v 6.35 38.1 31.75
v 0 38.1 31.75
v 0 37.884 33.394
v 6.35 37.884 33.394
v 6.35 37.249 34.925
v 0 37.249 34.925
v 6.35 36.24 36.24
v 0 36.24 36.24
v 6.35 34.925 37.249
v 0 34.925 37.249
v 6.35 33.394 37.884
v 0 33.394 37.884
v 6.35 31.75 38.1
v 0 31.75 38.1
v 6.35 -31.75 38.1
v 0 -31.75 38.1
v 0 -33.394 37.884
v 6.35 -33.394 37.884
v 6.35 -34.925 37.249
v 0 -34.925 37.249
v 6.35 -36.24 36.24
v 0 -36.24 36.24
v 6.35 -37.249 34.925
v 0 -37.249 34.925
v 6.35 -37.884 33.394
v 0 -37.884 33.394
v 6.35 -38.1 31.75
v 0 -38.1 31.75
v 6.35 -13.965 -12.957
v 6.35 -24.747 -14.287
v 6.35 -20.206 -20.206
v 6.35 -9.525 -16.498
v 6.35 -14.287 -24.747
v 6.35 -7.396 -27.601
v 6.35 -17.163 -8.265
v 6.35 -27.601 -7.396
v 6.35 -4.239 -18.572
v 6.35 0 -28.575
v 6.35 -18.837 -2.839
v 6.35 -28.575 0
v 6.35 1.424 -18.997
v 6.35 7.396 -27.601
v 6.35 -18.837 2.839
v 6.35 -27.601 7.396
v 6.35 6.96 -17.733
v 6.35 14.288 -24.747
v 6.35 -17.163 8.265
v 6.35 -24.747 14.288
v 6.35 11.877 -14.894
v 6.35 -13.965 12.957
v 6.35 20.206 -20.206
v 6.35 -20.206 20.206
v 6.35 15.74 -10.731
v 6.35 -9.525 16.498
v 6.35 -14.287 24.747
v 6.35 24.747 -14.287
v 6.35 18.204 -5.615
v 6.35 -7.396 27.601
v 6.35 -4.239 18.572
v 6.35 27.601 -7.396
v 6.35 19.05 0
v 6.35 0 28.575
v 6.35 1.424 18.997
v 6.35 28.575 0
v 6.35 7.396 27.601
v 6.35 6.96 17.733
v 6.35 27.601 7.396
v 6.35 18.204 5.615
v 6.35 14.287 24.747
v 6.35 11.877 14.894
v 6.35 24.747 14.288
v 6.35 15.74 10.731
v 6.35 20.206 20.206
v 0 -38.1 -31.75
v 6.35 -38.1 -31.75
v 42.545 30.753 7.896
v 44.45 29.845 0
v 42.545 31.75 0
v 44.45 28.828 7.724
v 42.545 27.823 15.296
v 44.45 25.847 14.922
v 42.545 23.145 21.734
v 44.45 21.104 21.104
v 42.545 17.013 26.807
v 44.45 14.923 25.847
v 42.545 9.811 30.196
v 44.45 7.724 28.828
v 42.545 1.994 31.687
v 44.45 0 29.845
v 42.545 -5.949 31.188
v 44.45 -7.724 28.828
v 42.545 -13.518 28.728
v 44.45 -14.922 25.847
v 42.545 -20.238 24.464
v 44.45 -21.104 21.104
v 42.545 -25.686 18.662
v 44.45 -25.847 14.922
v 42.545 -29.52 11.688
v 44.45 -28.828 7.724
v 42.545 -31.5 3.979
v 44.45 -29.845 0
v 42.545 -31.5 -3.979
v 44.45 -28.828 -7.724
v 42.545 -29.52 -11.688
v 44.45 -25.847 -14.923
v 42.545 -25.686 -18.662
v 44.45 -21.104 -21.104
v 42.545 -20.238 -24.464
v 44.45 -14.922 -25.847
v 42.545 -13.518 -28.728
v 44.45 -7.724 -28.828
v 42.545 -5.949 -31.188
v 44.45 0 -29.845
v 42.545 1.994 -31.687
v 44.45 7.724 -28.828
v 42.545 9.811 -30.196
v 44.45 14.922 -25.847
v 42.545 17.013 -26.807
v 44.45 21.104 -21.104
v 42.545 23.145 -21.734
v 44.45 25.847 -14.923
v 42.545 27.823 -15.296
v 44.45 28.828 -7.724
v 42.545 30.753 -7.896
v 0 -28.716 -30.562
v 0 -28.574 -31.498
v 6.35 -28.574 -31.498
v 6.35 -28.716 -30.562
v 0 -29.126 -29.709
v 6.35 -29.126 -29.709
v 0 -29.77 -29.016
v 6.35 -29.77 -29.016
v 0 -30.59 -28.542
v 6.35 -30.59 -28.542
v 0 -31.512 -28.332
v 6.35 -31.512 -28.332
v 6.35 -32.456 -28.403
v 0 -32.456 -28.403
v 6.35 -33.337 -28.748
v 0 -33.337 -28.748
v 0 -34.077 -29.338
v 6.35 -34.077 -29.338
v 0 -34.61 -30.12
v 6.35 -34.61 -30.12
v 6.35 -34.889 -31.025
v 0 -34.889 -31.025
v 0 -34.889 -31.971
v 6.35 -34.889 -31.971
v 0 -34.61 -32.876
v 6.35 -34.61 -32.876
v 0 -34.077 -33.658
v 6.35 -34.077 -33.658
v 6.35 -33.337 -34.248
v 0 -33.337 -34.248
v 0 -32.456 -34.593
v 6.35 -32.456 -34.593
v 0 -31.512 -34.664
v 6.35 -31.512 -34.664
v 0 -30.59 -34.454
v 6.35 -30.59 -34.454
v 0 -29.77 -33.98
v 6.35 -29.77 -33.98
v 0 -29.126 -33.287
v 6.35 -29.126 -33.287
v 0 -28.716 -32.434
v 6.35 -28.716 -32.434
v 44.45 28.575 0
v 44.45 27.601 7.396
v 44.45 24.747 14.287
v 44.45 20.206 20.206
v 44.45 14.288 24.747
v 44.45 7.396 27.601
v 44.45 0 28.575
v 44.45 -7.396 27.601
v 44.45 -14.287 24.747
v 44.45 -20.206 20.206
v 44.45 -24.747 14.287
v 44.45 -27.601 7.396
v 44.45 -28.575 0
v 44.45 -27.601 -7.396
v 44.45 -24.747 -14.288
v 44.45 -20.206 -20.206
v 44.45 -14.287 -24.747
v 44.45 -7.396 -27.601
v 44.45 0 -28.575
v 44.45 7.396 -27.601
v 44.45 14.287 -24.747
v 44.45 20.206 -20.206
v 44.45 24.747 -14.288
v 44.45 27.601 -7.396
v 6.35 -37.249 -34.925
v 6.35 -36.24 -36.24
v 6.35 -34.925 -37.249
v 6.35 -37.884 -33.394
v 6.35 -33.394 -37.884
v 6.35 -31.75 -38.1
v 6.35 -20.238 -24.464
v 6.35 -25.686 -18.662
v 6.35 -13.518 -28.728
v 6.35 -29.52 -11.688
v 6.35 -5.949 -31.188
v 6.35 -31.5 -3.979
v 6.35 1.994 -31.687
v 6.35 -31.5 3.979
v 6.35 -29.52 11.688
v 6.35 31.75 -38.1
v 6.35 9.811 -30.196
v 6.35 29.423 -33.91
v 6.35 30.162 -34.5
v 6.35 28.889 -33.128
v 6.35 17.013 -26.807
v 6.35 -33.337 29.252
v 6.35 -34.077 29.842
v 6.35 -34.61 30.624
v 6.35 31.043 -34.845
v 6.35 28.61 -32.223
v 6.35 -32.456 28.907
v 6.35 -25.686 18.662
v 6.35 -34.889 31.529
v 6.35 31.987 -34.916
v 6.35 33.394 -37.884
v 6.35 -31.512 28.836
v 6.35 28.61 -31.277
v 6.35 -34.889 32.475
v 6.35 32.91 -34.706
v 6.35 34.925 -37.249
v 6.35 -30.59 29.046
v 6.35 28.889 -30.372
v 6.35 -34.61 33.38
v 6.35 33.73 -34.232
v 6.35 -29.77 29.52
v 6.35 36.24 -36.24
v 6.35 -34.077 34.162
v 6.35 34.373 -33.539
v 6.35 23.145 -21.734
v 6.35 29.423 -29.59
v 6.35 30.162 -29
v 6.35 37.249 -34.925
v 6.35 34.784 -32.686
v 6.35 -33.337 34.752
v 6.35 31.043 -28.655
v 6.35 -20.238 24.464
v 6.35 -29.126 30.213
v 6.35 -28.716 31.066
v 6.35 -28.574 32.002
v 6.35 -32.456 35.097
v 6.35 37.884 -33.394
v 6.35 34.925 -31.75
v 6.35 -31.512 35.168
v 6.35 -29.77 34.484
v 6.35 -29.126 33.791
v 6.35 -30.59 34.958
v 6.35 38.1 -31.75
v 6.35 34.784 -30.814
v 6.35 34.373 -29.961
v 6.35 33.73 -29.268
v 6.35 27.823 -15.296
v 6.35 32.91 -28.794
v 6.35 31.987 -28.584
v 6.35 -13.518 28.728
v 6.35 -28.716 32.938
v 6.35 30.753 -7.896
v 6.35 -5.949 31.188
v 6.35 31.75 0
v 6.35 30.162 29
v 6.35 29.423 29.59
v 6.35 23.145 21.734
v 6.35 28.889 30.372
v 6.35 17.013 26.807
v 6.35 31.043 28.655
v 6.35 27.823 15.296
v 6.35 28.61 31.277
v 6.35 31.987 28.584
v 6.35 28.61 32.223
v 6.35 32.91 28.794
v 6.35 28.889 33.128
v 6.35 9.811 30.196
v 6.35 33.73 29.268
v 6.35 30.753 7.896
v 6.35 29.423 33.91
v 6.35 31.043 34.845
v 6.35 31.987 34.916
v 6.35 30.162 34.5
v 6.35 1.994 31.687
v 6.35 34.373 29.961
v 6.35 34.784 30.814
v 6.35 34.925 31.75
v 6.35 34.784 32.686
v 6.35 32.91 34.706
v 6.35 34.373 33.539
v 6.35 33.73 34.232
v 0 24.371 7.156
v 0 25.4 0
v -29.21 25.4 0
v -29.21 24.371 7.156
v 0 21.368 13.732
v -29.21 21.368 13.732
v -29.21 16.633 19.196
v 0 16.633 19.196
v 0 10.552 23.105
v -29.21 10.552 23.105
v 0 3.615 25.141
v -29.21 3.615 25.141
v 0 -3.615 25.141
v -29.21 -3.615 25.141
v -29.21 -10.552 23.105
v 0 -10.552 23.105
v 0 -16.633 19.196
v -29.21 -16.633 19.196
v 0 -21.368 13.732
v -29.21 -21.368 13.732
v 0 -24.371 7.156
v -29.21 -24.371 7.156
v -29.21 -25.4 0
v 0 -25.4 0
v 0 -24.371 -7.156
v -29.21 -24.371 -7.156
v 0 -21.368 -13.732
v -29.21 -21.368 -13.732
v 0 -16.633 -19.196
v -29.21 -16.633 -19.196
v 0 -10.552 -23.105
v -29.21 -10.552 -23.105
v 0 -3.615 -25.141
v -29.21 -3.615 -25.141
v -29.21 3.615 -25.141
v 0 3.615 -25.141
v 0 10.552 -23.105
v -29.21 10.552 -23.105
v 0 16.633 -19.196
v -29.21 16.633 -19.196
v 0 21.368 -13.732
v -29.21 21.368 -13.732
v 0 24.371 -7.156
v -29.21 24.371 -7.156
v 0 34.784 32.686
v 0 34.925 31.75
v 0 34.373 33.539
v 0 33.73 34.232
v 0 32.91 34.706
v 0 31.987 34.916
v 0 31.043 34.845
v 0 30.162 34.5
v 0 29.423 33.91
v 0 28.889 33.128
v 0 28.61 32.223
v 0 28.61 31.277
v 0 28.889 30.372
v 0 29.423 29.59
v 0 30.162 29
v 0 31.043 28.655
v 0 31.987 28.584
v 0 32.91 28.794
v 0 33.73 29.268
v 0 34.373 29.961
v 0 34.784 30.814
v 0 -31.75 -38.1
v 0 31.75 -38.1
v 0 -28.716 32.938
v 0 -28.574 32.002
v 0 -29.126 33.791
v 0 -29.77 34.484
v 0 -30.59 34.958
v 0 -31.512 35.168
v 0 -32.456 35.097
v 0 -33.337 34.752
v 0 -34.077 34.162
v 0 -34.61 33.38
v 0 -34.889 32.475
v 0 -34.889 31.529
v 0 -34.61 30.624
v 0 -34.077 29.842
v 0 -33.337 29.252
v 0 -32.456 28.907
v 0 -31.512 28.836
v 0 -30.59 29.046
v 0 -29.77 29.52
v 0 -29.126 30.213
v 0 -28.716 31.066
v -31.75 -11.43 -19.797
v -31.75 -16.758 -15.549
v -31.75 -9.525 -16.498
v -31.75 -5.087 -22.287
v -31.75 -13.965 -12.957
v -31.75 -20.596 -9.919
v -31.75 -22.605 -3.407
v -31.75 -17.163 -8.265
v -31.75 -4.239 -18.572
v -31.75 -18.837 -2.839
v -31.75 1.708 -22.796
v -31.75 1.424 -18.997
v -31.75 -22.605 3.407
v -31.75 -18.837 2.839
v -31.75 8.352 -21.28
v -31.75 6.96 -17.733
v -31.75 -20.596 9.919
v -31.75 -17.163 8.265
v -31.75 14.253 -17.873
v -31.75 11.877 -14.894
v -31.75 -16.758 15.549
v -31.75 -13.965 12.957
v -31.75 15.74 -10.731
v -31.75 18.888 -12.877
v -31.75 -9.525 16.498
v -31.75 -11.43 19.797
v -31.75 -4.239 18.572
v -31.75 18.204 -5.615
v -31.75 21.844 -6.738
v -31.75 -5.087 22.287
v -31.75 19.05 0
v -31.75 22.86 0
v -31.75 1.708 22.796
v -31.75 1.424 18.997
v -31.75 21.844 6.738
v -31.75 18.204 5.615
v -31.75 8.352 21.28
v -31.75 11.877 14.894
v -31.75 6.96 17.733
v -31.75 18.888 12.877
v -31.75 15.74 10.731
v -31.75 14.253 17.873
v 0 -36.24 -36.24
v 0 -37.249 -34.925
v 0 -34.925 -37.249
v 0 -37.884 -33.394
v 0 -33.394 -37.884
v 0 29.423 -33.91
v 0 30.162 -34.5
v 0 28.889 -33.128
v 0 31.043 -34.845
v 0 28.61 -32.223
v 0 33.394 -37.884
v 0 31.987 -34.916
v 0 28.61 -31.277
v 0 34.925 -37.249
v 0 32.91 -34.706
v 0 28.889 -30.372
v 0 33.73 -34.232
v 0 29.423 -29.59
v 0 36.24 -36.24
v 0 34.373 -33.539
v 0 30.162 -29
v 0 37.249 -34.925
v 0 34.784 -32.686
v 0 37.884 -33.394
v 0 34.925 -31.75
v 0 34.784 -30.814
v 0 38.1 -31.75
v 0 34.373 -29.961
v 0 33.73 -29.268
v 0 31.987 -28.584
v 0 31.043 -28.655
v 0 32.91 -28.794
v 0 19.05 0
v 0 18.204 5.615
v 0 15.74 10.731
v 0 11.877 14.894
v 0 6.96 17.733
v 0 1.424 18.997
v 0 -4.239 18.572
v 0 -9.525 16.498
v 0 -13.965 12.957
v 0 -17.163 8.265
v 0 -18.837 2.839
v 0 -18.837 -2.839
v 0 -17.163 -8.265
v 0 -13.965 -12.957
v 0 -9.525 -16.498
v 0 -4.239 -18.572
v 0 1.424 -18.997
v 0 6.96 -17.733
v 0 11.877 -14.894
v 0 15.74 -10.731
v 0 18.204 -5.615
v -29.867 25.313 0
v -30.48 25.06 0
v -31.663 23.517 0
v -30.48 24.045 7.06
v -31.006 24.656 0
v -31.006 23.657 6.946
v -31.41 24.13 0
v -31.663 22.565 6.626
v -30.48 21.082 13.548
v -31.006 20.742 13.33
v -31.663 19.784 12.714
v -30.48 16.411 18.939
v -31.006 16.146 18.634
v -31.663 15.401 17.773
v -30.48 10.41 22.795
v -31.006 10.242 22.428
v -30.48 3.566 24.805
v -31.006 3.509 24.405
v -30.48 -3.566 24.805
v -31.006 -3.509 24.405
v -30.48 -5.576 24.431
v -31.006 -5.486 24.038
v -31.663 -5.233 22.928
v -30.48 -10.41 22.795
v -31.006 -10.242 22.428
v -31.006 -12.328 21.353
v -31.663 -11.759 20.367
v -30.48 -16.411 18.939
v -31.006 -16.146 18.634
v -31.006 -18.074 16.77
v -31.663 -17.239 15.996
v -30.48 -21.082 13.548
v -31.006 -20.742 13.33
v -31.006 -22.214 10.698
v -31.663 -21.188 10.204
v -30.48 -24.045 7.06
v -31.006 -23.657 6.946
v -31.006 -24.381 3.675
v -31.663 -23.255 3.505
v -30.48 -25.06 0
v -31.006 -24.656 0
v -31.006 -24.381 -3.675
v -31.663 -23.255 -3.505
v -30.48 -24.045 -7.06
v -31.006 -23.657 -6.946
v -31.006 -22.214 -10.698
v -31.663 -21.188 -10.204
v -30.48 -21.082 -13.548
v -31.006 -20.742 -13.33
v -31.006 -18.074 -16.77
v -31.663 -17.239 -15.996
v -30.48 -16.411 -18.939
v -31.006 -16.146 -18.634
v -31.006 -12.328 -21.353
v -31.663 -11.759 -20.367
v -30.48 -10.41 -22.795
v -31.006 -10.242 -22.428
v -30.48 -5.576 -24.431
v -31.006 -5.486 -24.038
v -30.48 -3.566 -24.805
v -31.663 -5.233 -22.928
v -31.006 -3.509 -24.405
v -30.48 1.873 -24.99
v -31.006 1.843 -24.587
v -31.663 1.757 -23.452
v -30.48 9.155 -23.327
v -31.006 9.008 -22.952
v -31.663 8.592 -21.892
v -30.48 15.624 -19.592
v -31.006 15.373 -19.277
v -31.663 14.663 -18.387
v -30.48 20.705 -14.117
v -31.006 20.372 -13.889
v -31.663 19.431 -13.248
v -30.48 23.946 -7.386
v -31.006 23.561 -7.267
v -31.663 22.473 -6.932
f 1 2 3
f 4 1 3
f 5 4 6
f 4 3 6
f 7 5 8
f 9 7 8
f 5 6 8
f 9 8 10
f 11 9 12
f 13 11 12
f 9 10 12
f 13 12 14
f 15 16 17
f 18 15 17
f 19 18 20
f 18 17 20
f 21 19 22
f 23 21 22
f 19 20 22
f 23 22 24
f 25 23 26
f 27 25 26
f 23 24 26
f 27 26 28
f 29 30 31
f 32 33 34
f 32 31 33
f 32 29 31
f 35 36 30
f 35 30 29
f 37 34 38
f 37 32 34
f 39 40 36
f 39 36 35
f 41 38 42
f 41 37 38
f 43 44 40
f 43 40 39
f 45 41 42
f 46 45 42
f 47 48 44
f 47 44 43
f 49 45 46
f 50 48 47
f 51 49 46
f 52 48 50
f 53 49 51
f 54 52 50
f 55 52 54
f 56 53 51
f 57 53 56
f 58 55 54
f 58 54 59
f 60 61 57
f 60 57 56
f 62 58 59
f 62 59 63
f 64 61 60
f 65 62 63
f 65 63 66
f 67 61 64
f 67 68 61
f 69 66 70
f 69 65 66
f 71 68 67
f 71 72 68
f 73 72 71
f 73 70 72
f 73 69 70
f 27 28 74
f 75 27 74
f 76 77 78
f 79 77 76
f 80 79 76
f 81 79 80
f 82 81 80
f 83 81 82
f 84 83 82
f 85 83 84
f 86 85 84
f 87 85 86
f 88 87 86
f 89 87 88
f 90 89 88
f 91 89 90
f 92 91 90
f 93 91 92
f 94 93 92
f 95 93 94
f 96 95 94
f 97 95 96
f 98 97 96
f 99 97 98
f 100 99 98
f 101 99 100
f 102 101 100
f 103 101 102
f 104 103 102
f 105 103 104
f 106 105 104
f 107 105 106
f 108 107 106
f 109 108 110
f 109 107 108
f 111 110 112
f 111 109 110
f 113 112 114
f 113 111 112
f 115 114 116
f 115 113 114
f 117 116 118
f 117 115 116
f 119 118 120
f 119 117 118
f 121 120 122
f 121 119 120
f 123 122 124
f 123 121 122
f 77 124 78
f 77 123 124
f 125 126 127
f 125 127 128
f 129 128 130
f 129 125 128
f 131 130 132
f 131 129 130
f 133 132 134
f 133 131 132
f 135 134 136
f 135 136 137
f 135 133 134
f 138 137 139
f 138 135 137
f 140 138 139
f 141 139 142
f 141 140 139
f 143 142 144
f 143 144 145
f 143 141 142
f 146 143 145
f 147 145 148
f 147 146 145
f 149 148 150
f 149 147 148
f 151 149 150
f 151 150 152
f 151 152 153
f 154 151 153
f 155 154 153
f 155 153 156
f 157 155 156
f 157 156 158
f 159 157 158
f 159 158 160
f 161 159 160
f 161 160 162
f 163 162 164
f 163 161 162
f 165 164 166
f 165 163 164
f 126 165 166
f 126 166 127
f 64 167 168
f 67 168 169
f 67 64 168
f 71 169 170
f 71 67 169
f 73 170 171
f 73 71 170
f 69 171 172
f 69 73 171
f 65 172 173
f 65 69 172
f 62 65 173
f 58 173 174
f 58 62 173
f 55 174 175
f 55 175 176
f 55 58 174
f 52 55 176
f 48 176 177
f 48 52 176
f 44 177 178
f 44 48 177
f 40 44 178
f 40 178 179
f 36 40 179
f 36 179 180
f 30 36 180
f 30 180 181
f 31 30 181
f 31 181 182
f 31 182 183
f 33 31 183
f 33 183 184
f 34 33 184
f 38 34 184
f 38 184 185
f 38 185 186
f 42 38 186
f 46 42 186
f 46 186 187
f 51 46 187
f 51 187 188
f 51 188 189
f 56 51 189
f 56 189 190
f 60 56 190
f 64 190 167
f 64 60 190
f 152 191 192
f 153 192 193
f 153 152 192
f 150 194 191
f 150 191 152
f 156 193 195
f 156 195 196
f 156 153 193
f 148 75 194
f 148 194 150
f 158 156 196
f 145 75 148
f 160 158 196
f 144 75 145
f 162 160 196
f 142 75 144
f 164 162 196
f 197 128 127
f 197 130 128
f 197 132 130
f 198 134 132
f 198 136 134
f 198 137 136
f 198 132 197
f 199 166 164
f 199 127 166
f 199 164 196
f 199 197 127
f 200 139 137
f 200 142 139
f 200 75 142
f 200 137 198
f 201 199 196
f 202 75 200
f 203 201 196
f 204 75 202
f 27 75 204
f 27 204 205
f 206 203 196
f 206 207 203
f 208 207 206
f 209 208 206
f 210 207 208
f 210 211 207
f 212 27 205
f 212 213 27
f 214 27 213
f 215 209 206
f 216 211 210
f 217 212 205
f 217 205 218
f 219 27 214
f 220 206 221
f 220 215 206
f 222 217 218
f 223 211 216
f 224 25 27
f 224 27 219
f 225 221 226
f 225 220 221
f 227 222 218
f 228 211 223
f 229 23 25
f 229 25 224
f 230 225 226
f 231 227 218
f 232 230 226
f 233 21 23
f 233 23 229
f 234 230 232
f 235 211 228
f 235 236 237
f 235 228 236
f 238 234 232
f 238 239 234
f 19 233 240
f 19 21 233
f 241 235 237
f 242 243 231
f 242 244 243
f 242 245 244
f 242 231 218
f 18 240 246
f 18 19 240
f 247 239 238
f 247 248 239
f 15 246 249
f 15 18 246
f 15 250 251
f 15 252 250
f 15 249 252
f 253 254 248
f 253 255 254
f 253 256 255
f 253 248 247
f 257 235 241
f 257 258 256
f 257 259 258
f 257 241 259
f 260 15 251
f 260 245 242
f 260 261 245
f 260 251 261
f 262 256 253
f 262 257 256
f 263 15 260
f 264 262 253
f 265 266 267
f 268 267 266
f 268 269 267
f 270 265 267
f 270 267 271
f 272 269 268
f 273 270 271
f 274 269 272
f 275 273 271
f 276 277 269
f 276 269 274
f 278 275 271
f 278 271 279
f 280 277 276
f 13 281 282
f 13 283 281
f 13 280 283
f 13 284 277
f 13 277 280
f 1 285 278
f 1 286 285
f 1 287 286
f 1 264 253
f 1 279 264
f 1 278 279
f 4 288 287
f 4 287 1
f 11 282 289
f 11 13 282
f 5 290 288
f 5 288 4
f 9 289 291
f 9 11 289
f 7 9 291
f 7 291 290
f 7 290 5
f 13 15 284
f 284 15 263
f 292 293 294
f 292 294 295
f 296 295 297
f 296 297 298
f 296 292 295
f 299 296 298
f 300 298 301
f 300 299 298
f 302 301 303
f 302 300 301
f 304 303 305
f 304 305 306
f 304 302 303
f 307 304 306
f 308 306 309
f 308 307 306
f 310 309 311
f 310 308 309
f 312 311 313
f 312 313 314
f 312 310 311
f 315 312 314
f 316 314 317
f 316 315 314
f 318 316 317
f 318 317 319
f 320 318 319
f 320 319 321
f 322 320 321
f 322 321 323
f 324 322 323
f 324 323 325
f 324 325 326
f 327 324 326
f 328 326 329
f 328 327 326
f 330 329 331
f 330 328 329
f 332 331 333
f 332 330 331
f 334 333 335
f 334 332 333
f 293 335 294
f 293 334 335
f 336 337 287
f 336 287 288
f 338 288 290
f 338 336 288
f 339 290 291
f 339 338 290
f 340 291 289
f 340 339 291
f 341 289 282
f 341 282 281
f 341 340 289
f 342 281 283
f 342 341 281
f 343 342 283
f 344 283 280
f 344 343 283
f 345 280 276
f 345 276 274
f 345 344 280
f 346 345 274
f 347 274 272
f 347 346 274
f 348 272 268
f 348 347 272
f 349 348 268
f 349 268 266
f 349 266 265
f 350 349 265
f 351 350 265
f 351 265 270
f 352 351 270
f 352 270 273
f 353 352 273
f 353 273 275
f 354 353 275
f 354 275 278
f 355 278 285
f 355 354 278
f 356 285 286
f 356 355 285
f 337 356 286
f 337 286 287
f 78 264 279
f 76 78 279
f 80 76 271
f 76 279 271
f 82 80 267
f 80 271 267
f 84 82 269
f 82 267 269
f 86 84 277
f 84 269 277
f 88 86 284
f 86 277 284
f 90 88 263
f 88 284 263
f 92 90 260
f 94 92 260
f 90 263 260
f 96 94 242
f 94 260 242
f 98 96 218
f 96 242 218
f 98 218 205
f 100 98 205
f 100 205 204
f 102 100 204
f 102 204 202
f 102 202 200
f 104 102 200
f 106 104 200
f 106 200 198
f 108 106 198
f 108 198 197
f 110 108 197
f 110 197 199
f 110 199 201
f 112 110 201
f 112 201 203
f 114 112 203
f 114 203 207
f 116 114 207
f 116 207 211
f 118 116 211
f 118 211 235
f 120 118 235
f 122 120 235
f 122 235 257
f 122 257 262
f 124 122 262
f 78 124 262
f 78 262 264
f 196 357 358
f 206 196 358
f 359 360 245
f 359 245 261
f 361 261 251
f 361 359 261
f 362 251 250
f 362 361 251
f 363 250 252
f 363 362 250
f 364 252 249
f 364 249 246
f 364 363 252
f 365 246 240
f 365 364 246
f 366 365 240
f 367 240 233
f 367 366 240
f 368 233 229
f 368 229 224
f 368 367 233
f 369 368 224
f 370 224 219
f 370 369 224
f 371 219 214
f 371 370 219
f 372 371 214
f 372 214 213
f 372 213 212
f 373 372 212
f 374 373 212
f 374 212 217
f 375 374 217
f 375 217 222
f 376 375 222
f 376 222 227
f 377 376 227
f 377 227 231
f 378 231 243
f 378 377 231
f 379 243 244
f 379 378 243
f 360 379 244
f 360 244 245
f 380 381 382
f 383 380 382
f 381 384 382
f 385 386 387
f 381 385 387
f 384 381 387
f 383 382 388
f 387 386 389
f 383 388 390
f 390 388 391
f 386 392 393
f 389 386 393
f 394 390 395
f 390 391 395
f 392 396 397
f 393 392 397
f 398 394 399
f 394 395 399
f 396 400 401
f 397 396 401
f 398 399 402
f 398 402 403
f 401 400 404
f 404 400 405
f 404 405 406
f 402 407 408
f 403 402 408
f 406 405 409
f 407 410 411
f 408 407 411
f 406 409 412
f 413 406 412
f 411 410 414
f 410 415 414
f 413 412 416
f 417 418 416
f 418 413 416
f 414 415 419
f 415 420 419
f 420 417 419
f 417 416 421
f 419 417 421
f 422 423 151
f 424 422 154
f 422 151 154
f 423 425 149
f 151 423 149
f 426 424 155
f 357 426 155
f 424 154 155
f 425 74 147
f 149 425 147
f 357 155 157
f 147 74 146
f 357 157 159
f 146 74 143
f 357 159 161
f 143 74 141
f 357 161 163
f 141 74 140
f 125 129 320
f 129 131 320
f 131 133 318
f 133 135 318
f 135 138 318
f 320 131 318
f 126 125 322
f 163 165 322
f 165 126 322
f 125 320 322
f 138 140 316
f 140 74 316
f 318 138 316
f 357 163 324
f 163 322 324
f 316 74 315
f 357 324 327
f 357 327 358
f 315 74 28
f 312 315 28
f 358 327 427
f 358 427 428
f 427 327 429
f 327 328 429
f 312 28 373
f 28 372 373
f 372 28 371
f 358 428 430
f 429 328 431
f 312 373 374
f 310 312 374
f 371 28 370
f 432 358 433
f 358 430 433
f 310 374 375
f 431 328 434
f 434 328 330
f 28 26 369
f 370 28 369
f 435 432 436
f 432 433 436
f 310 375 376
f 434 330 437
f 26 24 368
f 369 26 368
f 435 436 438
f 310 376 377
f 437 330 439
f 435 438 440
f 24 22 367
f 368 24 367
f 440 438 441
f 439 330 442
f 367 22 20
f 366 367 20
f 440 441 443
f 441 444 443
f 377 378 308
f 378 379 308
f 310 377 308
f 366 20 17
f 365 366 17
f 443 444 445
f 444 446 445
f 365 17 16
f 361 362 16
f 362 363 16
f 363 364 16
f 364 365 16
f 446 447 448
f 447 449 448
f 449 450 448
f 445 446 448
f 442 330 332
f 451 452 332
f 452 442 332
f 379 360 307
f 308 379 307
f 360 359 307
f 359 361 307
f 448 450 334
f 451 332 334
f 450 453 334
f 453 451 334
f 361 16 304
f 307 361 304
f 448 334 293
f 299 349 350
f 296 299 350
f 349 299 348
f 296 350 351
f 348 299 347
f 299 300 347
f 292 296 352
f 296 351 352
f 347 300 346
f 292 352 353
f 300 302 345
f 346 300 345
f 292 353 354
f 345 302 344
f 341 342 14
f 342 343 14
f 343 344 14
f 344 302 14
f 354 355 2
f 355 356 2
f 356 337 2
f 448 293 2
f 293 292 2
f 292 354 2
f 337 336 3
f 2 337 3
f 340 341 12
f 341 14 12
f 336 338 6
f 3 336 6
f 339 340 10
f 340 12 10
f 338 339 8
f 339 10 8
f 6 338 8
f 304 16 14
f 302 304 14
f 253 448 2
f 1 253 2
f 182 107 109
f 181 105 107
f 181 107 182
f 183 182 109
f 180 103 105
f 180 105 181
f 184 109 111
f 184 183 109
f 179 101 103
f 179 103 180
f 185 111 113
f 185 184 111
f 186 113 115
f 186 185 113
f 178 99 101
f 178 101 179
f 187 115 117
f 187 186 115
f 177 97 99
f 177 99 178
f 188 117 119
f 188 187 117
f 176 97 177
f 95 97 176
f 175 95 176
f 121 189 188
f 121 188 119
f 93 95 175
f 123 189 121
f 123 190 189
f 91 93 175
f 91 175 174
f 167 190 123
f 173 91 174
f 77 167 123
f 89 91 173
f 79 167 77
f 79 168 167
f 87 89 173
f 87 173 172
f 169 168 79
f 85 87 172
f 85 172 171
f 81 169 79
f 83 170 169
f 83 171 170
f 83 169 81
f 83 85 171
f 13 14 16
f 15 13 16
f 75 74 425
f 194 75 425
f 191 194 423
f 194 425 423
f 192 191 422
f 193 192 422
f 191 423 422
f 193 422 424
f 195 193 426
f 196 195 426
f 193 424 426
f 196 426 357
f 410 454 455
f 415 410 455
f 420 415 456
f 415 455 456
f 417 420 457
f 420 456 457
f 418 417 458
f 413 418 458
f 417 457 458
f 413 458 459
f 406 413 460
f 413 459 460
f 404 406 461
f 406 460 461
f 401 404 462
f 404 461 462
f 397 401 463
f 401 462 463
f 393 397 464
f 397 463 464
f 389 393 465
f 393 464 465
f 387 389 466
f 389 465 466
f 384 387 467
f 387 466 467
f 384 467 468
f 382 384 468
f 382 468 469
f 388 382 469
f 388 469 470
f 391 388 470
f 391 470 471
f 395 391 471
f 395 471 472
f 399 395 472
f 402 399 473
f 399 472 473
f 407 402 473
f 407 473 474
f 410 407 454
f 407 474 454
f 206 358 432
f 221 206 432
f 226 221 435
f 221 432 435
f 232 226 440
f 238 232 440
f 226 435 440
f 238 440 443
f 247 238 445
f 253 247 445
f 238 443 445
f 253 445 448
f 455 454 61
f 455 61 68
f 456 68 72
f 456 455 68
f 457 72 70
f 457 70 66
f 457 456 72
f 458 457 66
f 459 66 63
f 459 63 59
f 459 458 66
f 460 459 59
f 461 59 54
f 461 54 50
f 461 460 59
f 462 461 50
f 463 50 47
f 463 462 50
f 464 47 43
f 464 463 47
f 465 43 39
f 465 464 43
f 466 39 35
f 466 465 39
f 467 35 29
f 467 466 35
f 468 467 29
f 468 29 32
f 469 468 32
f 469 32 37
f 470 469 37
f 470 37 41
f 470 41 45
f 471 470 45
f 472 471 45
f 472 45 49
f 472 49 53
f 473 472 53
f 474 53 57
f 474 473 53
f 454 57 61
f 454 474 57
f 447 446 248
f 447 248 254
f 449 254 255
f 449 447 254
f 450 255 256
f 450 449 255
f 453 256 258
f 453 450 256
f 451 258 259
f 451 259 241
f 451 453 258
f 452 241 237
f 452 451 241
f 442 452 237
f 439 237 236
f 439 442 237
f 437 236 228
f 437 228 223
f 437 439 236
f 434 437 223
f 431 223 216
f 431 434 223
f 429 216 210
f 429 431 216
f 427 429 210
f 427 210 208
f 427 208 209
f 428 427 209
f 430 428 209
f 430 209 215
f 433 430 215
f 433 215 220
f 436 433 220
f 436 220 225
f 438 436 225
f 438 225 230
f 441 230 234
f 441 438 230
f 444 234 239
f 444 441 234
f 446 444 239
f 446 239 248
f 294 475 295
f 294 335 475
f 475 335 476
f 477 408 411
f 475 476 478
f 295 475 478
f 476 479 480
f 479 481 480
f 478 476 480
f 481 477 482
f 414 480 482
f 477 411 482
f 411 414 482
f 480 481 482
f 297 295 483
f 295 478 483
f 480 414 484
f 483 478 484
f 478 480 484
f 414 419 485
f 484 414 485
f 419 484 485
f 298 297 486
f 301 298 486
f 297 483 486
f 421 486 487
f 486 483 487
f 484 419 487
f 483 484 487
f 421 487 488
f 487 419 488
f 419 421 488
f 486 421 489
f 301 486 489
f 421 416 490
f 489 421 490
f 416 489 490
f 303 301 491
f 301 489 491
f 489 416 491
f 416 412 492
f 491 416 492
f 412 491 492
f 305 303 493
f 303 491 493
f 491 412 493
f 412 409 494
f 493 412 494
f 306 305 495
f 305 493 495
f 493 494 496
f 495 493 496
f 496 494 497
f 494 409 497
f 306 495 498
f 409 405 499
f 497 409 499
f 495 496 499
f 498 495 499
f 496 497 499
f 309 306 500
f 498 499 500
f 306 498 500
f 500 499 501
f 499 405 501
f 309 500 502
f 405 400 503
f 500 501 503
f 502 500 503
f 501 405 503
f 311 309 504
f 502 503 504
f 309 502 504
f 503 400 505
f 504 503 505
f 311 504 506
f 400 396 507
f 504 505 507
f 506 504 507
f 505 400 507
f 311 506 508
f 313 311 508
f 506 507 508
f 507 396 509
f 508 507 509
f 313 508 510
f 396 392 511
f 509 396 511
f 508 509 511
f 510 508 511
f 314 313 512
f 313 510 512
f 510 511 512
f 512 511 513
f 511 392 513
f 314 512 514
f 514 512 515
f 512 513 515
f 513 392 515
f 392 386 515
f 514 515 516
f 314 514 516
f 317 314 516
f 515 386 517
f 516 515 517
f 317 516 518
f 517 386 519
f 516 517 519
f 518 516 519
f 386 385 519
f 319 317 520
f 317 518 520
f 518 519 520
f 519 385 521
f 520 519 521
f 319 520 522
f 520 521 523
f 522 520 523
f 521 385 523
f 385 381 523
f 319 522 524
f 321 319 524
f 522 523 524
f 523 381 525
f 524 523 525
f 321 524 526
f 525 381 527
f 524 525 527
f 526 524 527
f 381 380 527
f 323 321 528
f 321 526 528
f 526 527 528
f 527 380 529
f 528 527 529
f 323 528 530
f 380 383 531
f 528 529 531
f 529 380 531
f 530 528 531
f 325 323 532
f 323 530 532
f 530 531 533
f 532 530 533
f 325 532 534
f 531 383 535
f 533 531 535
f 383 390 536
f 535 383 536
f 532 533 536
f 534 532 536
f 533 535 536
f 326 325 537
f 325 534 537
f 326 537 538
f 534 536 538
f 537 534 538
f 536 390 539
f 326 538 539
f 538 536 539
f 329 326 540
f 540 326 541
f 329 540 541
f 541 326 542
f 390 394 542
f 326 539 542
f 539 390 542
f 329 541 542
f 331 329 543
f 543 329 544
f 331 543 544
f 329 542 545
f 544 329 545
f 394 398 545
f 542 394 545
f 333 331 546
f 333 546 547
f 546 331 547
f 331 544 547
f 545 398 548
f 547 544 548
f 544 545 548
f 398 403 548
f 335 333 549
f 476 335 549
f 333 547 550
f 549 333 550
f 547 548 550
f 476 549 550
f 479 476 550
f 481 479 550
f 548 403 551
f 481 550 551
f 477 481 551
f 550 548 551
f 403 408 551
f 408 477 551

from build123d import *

# Parameters (mm, degrees)
F0_R     = 3.175
F0_R_2   = 19.05
F1_DEPTH = 6.35
F2_R     = 31.75
F2_R_2   = 28.575
F3_DEPTH = 44.45
F4_SIZE2 = 1.905
F4_SIZE  = 1.905
F5_R     = 25.4
F5_R_2   = 19.05
F6_DEPTH = 31.75
F7_R     = 2.54


with BuildPart() as f1:
    # F0 (on Right) → F1 (new body)
    with BuildSketch(Plane.YZ):
        with BuildLine():
            ThreePointArc((-38.1, -31.75), (-36.240128, -36.240128), (-31.75, -38.1))
            Line((-31.75, -38.1), (31.75, -38.1))
            ThreePointArc((31.75, -38.1), (36.240128, -36.240128), (38.1, -31.75))
            Line((38.1, -31.75), (38.1, 31.75))
            ThreePointArc((38.1, 31.75), (36.240128, 36.240128), (31.75, 38.1))
            Line((31.75, 38.1), (-31.75, 38.1))
            ThreePointArc((-31.75, 38.1), (-36.240128, 36.240128), (-38.1, 31.75))
            Line((-38.1, 31.75), (-38.1, -31.75))
        make_face()
        with Locations((-31.7495, -31.498018)):
            Circle(F0_R, mode=Mode.SUBTRACT)
        with Locations((31.75, -31.75)):
            Circle(F0_R, mode=Mode.SUBTRACT)
        with Locations((-31.7495, 32.001982)):
            Circle(F0_R, mode=Mode.SUBTRACT)
        Circle(F0_R_2, mode=Mode.SUBTRACT)
        with Locations((31.75, 31.75)):
            Circle(F0_R, mode=Mode.SUBTRACT)
    extrude(amount=F1_DEPTH)

    # F2 (on Right) → F3 (join)
    with BuildSketch(Plane.YZ):
        Circle(F2_R)
        Circle(F2_R_2, mode=Mode.SUBTRACT)
    extrude(amount=F3_DEPTH)

    # F4
    f4_edges = [f1.edges().sort_by_distance(p)[0] for p in [
        (44.45, -31.75, 0),
    ]]
    chamfer(f4_edges, length=F4_SIZE, length2=F4_SIZE2)

    # F5 (on Right) → F6 (join)
    with BuildSketch(Plane.YZ):
        Circle(F5_R)
        Circle(F5_R_2, mode=Mode.SUBTRACT)
    extrude(amount=-F6_DEPTH)

    # F7
    f7_edges = [f1.edges().sort_by_distance(p)[0] for p in [
        (-31.75, -25.4, 0),
    ]]
    fillet(f7_edges, radius=F7_R)


solid = f1.part
